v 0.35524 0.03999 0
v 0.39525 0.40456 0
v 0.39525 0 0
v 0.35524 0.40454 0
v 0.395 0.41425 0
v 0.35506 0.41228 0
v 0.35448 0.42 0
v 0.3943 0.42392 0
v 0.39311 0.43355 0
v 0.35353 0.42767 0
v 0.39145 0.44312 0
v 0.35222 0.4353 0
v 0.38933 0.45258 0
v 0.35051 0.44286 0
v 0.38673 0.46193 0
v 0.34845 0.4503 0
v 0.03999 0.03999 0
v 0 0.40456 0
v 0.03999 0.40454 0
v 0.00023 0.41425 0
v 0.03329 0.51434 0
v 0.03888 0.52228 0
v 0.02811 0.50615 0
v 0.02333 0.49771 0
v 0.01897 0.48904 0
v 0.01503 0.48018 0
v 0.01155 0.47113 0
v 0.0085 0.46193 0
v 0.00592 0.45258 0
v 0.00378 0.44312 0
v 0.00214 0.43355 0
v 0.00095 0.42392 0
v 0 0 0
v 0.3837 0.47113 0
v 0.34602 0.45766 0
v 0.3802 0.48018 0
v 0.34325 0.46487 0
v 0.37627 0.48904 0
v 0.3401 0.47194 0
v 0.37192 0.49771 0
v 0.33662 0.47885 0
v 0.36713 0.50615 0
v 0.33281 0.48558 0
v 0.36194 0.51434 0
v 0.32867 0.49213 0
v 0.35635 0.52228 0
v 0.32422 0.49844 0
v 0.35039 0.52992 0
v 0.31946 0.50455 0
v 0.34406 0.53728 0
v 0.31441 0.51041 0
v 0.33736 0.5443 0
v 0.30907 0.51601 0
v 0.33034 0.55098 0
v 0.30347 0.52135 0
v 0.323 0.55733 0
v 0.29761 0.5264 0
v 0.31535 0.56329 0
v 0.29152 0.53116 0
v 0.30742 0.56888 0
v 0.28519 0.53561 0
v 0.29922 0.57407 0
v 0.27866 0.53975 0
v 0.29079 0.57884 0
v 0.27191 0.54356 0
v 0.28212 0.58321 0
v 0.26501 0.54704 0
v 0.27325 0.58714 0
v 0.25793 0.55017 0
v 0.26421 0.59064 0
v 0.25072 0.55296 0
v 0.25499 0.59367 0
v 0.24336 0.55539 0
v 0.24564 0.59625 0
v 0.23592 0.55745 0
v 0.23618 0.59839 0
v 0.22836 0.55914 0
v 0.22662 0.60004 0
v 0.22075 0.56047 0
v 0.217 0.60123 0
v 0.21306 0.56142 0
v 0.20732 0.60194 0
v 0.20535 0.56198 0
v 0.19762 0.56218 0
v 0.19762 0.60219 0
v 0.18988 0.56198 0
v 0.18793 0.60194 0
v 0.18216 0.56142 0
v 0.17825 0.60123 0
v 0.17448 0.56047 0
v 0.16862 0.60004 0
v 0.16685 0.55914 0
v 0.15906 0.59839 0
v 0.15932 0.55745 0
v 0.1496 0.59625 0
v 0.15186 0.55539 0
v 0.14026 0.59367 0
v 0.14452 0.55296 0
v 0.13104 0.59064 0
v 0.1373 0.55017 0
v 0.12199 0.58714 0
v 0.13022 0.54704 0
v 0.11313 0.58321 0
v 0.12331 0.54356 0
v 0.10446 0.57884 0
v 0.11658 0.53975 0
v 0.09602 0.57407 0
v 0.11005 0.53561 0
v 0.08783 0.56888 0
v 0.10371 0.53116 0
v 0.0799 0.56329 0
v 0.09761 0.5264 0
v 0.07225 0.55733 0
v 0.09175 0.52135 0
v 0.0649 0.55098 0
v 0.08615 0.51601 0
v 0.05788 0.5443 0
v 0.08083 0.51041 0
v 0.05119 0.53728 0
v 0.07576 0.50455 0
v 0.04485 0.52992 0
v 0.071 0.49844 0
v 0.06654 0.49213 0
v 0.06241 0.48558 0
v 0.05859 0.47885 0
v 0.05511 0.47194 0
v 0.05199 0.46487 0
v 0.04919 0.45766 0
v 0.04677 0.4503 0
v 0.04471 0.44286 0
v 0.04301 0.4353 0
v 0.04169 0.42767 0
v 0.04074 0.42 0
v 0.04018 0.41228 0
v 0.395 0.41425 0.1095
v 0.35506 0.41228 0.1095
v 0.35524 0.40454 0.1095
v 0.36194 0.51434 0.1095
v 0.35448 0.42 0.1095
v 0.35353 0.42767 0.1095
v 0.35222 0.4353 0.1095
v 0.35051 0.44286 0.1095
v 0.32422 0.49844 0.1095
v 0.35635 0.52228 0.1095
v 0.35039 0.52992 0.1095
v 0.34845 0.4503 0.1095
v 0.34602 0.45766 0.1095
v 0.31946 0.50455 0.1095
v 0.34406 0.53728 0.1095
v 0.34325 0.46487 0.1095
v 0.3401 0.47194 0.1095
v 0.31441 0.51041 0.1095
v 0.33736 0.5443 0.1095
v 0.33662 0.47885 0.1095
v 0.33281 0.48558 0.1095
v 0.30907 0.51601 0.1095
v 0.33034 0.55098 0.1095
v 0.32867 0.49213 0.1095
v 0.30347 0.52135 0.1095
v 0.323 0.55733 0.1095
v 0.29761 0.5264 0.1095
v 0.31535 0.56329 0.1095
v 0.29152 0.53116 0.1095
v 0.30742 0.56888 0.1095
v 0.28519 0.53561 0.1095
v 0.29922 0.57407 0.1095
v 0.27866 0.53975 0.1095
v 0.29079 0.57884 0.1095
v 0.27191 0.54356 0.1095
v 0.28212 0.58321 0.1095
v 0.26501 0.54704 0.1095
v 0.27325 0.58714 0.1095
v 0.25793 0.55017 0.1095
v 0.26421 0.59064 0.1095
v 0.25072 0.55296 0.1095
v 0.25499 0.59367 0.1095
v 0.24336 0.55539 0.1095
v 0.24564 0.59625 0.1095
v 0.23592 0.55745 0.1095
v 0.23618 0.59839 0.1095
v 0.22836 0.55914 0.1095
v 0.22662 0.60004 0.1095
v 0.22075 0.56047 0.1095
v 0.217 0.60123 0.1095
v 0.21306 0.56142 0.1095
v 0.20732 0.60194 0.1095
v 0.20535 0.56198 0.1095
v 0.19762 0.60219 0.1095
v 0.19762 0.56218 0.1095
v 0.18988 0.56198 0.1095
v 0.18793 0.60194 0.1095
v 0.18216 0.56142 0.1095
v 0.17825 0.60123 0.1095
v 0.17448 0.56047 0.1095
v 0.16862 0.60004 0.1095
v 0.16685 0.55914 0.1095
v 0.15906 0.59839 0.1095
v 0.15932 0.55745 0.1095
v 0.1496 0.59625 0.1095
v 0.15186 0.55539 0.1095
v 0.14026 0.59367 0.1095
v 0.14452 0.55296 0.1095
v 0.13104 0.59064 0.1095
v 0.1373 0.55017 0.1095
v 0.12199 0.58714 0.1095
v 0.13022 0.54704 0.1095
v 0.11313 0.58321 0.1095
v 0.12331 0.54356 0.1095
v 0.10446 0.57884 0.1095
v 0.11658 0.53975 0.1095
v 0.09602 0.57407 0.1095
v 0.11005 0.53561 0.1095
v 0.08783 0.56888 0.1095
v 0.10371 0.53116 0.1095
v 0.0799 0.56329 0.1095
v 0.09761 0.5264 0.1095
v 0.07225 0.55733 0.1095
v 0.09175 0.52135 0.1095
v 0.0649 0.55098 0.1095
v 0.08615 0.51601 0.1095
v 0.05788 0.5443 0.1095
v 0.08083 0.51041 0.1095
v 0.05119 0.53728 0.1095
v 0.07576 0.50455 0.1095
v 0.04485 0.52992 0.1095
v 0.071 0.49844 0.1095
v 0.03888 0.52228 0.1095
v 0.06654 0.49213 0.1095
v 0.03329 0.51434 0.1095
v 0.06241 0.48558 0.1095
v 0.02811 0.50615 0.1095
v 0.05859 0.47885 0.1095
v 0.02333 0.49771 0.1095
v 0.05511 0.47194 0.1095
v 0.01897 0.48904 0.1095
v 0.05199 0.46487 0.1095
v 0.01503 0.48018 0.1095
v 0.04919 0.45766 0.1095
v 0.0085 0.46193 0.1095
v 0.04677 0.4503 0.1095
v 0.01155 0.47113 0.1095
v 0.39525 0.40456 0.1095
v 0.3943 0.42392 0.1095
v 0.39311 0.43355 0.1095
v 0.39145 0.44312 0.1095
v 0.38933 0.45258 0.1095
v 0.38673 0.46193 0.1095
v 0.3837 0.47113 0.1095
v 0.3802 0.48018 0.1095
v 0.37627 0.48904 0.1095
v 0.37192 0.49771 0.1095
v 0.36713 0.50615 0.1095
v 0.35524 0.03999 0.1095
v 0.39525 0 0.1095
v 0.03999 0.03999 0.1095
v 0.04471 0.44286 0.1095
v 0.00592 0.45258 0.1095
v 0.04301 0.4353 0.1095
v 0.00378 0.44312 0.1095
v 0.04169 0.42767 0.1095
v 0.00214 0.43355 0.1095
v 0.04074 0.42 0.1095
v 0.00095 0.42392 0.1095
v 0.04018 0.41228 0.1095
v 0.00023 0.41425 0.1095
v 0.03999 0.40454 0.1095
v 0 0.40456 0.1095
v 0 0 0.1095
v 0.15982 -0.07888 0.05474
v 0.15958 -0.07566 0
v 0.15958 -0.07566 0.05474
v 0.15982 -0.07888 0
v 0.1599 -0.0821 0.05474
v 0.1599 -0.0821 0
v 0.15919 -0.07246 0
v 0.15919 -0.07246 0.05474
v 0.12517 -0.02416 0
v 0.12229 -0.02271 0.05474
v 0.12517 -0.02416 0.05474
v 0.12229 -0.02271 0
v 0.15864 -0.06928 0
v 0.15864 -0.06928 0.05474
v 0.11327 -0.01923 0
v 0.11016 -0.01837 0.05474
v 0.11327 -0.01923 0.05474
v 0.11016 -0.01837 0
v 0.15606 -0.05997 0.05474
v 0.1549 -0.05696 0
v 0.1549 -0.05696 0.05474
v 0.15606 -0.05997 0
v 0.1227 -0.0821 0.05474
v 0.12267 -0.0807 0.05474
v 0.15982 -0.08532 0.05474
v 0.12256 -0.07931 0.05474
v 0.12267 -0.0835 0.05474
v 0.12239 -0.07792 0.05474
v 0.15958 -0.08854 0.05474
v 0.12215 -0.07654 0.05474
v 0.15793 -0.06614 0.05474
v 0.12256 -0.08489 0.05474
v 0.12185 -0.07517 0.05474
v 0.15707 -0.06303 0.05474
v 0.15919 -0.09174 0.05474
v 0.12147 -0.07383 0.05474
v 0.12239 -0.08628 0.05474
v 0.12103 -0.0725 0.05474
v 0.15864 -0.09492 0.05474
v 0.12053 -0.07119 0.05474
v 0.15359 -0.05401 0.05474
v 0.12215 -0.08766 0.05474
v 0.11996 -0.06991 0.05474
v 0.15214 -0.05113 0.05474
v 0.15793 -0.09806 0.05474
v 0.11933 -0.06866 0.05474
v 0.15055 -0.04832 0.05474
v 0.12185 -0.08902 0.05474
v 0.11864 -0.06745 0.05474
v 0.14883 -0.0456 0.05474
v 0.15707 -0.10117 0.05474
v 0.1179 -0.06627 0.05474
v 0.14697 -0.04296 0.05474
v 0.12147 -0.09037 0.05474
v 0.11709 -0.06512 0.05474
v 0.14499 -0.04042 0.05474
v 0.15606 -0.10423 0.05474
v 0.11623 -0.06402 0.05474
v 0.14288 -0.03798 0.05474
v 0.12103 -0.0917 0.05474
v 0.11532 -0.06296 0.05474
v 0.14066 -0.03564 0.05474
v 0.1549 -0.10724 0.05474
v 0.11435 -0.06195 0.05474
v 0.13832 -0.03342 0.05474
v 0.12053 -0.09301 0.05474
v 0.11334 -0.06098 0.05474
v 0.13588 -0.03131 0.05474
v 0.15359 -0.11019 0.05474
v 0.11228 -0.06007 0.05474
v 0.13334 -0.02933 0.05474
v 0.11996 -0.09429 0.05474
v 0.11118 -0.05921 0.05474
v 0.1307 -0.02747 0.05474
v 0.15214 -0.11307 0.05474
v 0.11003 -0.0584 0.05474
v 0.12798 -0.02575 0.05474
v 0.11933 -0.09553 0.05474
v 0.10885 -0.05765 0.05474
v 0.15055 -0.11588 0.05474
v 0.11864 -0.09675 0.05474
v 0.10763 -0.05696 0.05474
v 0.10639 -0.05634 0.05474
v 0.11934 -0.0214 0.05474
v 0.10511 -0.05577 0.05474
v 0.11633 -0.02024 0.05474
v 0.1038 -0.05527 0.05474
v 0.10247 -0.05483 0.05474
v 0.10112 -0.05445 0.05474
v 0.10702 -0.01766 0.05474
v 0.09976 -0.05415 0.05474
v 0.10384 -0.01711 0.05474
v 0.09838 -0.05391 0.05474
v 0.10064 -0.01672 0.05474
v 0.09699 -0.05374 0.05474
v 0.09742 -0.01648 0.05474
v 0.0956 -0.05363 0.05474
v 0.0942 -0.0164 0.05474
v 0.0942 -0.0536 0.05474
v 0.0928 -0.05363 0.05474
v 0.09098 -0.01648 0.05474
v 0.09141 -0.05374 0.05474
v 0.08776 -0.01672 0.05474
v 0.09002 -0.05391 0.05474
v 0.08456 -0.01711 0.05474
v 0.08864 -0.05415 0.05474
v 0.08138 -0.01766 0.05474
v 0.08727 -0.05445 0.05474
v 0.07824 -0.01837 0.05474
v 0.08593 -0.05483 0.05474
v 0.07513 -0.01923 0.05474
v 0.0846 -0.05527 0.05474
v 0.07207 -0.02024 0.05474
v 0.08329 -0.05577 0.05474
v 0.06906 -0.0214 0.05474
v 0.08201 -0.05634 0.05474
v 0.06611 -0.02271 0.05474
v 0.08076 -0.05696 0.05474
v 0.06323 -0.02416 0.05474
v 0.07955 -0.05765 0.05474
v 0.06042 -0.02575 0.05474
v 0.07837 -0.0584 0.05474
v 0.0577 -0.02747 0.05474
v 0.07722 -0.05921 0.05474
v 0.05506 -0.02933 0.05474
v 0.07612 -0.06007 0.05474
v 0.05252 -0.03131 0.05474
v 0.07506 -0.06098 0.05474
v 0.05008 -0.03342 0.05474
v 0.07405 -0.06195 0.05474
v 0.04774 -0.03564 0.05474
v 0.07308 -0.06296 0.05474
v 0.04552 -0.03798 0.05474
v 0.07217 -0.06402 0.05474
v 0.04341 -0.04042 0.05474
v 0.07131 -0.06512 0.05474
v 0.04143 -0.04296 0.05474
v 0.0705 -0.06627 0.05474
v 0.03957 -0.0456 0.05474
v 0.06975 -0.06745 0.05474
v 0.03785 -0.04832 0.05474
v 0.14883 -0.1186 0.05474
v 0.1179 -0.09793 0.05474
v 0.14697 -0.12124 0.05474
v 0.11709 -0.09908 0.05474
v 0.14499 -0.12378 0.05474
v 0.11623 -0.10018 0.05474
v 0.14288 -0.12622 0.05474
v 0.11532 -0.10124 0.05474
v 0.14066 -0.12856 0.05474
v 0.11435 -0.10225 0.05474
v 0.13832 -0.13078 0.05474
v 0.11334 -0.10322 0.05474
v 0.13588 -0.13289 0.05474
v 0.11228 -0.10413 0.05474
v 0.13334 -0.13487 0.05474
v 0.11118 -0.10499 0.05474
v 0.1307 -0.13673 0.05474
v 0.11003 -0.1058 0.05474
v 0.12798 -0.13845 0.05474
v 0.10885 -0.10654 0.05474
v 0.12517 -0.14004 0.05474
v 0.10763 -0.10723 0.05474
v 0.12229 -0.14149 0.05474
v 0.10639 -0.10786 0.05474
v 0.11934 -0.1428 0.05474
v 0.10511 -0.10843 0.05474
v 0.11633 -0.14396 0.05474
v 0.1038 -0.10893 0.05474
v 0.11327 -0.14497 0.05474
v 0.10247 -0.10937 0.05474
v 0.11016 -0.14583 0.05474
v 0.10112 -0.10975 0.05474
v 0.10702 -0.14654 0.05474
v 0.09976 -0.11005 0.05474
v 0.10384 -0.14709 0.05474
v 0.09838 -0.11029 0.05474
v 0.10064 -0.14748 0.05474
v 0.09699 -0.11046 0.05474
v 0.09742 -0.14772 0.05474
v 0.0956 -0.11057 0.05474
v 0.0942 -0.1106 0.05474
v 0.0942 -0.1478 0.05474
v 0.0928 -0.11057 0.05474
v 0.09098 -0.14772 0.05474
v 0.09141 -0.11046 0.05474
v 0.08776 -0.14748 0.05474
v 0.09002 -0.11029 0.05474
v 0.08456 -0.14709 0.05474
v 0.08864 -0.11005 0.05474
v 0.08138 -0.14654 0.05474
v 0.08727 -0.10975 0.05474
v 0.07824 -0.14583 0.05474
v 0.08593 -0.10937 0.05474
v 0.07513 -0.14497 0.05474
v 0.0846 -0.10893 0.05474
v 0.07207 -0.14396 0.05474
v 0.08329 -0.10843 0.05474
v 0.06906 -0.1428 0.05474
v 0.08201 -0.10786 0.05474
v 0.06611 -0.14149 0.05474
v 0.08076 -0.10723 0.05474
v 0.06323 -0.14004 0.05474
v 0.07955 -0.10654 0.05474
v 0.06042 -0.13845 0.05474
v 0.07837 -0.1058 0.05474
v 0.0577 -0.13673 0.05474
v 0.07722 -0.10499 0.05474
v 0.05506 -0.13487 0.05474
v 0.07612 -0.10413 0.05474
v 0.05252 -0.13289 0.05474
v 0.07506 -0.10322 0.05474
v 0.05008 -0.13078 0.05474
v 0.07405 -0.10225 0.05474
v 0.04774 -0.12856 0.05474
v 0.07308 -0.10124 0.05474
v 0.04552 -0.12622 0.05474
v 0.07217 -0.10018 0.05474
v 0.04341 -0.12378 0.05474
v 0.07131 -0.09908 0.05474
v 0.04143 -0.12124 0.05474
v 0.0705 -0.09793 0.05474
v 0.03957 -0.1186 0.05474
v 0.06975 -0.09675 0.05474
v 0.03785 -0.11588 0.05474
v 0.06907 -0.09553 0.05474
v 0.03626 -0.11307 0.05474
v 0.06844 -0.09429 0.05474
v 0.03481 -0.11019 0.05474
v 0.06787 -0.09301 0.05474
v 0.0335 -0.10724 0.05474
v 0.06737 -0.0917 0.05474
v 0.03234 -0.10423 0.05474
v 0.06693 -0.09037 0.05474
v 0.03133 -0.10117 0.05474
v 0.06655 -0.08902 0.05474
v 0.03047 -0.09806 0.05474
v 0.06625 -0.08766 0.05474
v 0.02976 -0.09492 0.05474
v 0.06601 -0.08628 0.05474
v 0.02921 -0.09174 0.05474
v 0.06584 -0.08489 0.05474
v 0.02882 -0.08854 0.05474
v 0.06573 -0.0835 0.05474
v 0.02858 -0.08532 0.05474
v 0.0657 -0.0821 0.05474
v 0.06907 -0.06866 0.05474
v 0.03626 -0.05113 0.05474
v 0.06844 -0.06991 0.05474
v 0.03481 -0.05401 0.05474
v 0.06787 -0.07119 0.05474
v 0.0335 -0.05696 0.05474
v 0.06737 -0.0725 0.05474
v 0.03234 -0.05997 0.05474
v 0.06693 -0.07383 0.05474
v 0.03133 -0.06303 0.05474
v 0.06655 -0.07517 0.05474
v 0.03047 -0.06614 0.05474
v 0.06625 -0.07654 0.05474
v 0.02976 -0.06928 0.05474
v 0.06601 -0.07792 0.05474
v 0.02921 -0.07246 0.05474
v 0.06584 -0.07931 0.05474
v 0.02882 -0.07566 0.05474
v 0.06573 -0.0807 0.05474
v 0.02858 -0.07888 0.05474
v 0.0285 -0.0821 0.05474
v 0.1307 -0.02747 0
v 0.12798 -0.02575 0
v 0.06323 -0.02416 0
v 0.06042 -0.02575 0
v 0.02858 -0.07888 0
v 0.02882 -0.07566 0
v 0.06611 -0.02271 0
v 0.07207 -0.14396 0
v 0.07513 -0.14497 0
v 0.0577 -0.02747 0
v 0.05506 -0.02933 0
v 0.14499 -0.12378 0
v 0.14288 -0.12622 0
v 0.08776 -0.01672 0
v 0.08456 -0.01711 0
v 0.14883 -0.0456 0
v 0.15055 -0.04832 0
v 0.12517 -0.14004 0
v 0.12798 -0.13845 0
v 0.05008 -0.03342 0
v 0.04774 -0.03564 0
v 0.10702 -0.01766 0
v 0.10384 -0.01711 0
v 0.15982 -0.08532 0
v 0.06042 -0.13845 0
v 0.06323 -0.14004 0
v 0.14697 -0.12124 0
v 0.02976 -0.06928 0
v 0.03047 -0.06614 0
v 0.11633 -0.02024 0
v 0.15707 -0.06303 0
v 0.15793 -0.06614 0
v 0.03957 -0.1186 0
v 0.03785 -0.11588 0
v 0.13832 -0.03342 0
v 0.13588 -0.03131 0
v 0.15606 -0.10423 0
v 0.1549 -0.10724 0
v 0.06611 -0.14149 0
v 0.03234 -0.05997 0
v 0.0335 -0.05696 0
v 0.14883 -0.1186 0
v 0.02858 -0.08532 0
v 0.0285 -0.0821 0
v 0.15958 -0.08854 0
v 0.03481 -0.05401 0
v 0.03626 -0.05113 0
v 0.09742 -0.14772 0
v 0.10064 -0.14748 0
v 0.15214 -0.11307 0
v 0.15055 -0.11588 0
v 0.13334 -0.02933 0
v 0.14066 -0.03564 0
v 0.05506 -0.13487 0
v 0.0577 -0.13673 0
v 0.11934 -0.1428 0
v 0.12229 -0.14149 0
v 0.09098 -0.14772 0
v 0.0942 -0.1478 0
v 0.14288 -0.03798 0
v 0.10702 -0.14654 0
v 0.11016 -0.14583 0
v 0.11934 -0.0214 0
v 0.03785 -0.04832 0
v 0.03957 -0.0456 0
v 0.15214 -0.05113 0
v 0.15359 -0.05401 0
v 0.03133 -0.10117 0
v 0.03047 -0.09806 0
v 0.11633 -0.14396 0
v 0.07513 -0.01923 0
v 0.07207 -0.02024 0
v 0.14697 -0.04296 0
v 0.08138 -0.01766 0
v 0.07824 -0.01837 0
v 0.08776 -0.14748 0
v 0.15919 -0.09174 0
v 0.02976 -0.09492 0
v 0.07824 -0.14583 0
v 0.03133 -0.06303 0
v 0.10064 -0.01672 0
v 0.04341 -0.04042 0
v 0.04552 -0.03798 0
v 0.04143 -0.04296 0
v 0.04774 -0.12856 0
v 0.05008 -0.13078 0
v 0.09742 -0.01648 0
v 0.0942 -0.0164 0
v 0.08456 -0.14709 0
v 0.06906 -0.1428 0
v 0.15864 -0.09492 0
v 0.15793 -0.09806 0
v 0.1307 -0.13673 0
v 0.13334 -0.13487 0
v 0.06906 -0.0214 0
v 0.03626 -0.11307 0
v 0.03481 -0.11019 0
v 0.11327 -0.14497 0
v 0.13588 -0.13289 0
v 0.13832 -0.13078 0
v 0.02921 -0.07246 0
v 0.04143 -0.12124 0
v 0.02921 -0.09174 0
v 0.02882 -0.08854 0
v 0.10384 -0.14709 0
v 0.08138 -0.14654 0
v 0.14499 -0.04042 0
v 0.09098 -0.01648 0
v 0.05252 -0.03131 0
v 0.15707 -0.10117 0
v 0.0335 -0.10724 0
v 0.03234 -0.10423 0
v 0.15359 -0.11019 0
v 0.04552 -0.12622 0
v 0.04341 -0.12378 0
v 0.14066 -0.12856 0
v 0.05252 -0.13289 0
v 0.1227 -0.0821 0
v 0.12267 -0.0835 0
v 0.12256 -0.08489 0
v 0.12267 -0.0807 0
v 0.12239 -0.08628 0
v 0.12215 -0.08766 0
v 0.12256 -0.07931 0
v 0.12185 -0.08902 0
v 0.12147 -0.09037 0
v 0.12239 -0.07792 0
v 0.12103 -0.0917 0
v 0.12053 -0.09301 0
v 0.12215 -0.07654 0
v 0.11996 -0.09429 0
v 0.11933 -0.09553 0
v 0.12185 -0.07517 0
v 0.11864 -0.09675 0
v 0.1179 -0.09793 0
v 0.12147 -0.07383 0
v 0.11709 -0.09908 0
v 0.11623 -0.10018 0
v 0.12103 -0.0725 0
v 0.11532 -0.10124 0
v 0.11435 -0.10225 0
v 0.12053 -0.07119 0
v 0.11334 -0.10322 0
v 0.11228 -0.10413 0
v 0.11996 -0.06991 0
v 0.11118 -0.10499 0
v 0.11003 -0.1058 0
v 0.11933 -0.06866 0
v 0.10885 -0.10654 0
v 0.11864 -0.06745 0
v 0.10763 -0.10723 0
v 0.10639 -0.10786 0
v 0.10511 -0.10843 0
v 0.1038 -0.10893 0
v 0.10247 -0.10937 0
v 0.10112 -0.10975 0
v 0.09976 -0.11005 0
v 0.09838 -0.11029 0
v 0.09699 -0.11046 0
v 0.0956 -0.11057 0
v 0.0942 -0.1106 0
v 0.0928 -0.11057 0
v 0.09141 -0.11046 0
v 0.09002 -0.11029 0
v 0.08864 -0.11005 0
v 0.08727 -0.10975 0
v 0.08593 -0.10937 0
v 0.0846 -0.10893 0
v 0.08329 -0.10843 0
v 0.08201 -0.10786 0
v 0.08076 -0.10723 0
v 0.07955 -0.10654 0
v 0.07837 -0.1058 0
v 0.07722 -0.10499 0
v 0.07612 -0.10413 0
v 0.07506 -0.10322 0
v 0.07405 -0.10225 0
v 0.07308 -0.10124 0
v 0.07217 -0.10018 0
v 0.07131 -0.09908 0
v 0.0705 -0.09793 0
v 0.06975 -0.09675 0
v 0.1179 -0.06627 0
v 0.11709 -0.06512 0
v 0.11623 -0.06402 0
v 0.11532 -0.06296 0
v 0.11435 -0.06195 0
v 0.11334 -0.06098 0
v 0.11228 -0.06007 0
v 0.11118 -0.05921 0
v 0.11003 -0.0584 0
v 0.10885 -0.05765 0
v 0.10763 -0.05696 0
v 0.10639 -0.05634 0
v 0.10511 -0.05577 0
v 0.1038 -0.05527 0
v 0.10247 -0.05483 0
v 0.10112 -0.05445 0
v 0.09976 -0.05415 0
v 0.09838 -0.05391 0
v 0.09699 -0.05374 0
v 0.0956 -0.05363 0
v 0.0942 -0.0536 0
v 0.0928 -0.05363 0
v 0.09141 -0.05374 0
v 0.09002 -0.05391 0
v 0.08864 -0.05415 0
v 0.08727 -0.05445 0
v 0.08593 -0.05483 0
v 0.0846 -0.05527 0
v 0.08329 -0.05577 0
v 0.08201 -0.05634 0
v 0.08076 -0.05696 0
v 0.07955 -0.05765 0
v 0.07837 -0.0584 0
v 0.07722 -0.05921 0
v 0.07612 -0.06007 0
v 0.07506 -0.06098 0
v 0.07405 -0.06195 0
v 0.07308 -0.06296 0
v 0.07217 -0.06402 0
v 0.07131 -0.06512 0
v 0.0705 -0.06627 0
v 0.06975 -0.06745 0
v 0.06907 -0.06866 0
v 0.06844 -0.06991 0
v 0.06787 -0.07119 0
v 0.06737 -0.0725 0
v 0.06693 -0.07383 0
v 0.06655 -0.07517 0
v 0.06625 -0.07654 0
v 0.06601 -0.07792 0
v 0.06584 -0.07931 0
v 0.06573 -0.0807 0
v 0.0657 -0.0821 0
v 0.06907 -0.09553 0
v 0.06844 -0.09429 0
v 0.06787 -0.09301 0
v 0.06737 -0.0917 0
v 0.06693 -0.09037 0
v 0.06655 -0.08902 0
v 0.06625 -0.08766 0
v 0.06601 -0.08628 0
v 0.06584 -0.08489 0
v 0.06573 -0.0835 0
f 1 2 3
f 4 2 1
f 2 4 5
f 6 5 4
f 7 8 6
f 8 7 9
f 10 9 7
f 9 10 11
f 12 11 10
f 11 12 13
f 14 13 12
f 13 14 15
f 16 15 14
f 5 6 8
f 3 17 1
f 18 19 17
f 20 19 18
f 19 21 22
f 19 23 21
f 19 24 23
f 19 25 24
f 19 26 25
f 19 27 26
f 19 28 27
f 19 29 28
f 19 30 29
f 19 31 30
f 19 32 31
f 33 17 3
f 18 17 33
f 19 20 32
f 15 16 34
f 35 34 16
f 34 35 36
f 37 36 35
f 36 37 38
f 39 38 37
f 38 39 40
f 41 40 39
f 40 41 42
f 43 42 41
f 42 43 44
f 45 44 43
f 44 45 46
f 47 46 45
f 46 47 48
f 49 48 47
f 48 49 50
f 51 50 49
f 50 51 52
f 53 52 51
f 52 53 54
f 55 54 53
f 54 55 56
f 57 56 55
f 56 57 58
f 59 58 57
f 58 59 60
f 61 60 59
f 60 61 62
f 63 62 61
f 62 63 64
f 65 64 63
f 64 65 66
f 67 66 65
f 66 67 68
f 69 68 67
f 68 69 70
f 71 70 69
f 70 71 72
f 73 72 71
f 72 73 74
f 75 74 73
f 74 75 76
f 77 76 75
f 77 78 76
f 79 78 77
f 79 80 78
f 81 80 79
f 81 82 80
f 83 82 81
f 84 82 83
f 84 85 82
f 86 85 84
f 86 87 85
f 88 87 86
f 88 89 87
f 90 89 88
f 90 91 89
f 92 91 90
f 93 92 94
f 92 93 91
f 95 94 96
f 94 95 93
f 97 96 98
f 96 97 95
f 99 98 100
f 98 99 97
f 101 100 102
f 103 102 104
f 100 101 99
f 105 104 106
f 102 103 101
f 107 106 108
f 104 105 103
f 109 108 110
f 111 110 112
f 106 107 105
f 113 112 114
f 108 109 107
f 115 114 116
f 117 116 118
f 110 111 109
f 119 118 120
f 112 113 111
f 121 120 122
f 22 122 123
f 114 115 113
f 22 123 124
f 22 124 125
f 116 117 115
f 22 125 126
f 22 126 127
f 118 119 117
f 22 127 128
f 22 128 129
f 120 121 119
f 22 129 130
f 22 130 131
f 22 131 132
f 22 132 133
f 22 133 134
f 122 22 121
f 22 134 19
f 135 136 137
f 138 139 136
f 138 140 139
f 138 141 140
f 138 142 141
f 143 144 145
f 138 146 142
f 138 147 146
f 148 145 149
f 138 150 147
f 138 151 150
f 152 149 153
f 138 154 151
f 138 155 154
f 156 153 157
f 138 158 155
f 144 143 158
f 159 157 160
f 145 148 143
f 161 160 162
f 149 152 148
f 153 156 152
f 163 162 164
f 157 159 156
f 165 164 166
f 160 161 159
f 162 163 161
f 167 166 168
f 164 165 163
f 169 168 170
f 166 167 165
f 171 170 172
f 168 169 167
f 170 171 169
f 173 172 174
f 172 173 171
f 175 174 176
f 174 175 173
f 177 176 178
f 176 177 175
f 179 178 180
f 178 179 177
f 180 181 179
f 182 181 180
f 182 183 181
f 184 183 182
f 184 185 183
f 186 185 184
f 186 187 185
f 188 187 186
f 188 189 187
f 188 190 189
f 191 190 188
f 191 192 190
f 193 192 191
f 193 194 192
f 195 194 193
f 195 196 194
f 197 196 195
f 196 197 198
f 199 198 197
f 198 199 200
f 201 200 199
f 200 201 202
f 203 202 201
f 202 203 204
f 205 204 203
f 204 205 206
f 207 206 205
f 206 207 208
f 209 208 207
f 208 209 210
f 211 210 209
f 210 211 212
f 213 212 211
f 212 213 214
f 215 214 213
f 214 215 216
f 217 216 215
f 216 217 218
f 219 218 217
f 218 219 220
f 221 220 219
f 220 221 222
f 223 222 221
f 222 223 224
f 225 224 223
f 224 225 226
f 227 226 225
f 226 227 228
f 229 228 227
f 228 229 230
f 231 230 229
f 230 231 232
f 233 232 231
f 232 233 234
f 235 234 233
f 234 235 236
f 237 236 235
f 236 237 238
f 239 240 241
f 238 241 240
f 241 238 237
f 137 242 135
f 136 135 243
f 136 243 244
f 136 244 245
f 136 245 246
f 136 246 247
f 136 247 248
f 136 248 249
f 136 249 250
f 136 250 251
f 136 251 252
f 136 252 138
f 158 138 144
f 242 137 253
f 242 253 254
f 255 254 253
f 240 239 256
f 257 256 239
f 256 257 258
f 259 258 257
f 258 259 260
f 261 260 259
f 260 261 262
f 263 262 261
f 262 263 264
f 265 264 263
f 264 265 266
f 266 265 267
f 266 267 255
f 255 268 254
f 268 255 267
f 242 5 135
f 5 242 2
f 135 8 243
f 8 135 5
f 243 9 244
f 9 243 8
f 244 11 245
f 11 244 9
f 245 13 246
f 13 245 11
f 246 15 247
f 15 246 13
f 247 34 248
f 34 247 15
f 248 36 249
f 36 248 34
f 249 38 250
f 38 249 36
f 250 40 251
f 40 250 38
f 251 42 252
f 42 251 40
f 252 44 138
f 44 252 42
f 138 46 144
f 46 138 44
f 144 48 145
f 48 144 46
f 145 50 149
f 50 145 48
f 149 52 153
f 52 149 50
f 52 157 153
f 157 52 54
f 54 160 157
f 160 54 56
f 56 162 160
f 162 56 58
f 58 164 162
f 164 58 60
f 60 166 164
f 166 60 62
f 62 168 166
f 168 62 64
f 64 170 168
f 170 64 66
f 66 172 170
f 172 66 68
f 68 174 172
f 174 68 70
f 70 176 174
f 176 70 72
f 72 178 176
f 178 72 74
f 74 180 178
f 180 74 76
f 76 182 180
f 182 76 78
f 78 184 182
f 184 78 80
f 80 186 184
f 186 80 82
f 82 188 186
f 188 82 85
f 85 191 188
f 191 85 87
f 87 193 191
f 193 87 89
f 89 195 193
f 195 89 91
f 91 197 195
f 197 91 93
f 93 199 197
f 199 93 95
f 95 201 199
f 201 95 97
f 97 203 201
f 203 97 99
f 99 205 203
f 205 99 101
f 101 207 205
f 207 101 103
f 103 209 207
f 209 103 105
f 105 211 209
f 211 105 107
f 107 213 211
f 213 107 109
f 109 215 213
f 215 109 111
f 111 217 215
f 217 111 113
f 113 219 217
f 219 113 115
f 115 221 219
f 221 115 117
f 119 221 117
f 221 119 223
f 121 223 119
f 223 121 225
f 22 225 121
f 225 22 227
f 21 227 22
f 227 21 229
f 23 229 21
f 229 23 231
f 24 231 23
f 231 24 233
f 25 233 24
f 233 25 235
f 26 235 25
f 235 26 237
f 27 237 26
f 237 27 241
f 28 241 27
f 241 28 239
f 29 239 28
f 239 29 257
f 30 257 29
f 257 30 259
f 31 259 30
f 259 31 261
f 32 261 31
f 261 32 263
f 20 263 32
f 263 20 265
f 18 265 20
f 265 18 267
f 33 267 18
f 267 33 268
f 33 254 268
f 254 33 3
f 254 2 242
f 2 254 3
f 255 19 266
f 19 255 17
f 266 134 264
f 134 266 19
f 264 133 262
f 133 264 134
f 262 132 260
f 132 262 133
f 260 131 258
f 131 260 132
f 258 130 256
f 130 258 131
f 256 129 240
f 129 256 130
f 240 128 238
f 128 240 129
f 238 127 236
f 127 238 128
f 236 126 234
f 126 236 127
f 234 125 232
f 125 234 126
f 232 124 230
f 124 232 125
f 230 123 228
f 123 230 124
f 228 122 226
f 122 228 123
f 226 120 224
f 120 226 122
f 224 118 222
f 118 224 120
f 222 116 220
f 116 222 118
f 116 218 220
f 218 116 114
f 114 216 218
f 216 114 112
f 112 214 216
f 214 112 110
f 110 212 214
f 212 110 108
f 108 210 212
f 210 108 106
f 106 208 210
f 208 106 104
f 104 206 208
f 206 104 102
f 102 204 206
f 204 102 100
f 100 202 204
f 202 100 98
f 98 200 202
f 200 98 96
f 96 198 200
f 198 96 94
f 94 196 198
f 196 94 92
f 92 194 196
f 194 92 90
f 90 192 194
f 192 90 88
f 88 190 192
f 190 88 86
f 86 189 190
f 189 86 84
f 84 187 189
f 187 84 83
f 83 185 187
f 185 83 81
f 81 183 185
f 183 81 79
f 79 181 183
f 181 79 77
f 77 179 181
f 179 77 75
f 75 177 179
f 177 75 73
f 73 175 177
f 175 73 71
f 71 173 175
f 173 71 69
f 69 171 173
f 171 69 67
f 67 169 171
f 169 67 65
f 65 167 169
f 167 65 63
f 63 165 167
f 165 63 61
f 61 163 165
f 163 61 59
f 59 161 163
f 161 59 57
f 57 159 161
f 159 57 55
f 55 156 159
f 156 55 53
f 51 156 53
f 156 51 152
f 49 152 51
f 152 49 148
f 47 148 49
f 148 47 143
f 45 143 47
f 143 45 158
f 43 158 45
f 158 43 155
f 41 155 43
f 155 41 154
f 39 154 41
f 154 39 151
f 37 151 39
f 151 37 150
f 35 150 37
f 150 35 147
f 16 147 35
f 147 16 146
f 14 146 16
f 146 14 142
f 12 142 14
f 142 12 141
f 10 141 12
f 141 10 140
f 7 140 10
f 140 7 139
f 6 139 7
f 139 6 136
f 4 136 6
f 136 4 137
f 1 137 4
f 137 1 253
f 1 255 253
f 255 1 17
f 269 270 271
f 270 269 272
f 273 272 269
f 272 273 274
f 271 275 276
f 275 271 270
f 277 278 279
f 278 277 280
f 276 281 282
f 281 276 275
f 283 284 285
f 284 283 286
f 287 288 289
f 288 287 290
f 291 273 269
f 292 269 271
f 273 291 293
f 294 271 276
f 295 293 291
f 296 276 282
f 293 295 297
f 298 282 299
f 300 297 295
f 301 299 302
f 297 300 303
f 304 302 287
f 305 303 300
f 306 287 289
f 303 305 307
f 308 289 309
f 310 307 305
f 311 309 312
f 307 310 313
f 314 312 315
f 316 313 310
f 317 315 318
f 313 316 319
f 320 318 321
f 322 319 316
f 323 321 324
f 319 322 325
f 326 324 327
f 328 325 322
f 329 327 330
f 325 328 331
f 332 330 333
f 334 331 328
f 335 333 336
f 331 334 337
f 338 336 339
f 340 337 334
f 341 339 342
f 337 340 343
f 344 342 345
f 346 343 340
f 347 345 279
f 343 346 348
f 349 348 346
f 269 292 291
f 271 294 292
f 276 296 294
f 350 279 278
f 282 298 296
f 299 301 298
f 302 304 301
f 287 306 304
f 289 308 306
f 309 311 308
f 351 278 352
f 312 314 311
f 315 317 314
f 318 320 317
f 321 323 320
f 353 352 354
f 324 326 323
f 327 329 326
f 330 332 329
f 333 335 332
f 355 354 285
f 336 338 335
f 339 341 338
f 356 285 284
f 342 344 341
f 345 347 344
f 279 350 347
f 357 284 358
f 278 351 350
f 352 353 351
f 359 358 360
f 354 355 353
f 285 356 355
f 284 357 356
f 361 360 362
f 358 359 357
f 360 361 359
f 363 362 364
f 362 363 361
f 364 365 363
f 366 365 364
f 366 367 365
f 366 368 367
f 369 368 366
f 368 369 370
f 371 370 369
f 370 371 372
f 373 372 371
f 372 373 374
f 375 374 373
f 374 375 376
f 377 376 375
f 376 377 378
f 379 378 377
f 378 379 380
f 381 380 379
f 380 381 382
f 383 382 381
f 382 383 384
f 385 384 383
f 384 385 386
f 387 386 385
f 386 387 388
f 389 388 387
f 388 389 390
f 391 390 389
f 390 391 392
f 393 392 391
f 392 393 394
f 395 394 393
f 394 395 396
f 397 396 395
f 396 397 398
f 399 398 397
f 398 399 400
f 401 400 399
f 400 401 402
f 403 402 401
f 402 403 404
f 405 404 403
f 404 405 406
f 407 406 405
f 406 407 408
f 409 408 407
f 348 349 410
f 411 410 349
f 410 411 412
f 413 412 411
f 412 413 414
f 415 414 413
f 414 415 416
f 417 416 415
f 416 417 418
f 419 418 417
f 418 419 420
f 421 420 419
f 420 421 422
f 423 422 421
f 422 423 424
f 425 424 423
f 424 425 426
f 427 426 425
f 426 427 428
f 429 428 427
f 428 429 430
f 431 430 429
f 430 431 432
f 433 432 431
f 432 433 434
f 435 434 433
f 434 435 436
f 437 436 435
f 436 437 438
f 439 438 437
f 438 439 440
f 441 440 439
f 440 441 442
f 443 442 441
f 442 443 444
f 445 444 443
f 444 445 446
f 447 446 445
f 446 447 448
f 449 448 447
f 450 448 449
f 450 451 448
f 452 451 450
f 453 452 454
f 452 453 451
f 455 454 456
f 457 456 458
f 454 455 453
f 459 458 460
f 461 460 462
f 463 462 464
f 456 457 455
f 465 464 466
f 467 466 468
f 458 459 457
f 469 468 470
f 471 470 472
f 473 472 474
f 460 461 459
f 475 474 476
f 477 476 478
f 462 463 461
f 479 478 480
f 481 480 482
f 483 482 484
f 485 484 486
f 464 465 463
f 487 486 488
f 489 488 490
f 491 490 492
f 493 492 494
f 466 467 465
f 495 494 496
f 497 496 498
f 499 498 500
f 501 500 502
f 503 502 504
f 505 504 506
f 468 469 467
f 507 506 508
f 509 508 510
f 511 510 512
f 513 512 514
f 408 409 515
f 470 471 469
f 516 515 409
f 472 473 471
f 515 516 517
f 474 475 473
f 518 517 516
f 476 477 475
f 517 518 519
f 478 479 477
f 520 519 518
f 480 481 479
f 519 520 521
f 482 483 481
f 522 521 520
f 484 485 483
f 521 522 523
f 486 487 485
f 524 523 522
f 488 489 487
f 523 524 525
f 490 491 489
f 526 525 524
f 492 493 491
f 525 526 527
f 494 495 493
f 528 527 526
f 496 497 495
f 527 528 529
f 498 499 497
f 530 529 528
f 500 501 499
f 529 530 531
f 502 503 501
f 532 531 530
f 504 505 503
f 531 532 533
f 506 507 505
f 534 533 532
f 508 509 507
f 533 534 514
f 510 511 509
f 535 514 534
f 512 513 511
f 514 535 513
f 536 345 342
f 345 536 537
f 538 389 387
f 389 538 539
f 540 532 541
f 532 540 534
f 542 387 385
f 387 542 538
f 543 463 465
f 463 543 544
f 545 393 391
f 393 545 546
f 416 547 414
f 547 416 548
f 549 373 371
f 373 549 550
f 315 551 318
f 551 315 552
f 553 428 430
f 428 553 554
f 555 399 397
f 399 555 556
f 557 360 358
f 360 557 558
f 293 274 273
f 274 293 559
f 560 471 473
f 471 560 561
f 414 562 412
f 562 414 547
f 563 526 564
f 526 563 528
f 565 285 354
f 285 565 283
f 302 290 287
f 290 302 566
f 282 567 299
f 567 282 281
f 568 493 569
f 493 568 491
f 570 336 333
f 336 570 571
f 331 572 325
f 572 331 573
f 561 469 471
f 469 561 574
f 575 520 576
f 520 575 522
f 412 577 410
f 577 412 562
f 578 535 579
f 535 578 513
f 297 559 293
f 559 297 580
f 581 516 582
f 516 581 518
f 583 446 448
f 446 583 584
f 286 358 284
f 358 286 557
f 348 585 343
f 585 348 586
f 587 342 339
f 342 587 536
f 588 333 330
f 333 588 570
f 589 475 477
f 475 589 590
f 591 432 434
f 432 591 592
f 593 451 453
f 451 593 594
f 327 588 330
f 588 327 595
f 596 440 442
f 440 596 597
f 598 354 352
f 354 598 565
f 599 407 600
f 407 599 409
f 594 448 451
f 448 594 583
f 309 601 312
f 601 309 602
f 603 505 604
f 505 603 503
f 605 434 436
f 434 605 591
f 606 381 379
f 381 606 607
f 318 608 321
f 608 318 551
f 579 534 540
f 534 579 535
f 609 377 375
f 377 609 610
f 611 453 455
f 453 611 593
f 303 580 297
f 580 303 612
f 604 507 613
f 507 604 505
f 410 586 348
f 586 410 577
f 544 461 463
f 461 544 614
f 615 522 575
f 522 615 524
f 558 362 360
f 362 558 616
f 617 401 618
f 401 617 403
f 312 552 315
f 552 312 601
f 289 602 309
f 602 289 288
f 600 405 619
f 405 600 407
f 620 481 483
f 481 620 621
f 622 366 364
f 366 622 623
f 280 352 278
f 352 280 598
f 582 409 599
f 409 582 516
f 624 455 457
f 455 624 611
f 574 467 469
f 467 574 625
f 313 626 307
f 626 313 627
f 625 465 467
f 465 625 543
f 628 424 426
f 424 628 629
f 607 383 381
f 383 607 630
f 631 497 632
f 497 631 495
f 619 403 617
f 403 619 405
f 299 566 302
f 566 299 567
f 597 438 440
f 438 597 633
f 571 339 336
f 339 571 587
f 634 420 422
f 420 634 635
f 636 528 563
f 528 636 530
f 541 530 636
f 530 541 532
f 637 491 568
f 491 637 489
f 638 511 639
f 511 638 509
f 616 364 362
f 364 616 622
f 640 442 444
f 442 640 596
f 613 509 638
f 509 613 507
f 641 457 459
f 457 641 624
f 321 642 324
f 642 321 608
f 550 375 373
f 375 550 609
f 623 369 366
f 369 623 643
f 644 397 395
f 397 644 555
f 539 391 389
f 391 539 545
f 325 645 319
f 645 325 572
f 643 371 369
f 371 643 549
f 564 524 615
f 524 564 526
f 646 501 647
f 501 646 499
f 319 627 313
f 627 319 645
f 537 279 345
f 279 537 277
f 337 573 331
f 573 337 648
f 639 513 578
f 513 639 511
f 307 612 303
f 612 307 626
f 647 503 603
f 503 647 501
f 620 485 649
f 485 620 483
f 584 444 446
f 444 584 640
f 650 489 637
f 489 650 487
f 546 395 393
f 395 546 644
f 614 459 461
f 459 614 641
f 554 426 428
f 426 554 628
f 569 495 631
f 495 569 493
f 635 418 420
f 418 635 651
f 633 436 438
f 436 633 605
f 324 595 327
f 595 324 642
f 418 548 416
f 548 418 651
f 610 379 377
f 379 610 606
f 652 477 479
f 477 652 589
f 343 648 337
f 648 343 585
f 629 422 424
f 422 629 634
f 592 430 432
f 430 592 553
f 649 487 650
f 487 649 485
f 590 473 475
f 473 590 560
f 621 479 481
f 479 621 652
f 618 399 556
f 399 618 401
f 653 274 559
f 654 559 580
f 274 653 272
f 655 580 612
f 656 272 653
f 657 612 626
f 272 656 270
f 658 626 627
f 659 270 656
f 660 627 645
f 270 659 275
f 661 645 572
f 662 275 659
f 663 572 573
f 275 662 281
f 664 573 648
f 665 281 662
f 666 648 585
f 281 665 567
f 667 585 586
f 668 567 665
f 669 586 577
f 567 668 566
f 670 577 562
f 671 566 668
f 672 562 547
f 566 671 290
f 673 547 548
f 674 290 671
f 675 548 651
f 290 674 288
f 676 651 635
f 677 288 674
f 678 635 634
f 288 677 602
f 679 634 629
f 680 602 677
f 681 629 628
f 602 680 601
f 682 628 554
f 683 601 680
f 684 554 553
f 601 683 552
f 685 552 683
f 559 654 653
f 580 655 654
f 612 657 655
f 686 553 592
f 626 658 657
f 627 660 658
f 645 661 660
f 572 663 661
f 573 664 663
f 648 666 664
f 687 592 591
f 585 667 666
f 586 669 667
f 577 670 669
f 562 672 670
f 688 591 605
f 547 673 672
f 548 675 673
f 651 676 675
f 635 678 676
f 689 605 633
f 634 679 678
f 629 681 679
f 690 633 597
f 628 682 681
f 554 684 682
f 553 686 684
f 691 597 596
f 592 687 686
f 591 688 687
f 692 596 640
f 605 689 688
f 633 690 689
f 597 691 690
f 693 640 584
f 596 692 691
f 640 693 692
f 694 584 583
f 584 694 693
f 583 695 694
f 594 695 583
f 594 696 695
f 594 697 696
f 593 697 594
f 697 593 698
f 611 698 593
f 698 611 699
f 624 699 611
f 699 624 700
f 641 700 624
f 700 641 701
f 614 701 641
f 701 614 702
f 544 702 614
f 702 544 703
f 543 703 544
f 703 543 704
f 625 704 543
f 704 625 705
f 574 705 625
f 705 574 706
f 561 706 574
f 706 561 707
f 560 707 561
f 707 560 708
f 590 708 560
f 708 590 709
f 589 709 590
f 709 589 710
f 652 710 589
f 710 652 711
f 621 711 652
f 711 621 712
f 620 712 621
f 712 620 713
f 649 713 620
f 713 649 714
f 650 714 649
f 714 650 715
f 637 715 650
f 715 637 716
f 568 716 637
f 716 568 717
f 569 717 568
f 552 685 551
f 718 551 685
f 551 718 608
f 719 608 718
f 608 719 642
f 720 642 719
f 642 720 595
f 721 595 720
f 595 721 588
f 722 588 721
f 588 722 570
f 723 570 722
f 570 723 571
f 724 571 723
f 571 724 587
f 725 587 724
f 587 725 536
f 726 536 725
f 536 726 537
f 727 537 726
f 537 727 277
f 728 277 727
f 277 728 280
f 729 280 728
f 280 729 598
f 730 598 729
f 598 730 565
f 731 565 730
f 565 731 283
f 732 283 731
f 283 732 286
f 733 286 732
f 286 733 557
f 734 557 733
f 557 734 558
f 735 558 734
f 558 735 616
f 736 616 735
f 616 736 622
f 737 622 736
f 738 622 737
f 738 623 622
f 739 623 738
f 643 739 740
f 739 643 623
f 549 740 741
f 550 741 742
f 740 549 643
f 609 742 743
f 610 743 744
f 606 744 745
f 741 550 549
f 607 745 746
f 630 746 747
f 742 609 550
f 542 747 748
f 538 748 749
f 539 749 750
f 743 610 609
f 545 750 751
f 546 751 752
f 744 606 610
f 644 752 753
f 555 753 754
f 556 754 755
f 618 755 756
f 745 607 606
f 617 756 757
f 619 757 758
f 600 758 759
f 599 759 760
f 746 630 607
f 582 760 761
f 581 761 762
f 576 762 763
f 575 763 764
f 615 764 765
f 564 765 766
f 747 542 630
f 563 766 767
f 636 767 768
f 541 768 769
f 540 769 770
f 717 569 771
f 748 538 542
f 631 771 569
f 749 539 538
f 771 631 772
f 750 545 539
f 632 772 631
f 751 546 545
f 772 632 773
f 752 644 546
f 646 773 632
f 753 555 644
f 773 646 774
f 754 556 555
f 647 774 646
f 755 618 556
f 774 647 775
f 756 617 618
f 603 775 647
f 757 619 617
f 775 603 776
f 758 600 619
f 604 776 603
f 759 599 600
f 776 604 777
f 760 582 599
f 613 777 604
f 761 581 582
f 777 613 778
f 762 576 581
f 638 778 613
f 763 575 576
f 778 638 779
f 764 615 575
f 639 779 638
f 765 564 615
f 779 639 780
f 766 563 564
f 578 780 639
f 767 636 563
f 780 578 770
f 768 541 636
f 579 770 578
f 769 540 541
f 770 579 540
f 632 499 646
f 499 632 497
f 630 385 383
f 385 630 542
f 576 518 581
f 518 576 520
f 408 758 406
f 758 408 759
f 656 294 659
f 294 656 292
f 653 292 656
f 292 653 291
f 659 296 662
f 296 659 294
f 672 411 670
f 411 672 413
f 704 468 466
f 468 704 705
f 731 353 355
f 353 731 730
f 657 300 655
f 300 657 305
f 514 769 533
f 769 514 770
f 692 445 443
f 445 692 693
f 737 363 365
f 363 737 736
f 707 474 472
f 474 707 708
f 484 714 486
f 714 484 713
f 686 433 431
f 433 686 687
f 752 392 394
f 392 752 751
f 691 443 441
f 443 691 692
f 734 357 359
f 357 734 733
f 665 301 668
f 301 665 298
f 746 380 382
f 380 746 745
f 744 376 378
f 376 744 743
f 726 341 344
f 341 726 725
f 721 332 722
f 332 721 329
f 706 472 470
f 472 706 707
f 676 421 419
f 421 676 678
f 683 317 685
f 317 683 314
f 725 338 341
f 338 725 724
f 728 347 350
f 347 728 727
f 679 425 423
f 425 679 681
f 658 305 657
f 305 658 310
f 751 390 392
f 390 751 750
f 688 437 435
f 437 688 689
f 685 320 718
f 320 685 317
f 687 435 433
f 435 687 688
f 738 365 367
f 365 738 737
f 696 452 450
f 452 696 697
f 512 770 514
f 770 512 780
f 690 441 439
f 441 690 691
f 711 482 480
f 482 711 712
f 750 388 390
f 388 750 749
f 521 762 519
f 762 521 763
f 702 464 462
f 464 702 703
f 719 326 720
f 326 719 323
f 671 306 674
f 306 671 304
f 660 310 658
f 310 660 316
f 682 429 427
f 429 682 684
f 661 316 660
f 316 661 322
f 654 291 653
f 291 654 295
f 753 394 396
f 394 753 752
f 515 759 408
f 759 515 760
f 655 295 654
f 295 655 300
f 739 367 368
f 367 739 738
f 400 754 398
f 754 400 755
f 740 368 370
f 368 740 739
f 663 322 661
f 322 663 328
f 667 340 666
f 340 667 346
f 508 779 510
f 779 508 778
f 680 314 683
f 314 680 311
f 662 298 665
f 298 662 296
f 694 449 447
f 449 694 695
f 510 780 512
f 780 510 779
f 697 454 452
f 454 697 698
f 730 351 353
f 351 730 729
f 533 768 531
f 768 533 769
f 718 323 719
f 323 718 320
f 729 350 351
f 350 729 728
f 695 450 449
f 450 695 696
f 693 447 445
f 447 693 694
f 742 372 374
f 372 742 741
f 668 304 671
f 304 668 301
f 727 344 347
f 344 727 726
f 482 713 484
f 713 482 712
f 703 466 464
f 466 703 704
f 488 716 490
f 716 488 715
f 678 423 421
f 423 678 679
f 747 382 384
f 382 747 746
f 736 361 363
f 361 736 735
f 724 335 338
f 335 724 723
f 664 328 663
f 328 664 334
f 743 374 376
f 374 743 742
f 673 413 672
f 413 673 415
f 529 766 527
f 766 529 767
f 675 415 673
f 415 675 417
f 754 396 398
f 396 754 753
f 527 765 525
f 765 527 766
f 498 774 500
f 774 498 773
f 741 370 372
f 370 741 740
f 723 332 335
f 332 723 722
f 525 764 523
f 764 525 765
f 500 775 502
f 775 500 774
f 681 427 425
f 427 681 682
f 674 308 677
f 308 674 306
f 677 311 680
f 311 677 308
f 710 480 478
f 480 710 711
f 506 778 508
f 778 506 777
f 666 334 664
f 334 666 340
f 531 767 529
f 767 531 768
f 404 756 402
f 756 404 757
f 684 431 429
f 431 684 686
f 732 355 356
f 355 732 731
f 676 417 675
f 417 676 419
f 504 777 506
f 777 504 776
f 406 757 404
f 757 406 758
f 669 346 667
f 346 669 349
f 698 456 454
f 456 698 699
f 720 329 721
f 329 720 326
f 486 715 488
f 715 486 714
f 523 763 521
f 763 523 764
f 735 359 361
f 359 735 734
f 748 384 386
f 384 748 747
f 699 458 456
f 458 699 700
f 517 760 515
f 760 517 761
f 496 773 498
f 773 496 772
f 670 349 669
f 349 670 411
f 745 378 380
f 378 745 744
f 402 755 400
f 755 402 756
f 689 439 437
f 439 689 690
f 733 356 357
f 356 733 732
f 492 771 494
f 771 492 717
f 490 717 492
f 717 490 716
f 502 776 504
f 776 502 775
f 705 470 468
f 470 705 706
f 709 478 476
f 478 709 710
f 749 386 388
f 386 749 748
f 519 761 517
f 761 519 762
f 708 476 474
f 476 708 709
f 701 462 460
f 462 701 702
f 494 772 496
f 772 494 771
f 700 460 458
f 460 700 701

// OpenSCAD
// =========================================================
// Parametric D-Shaped Frame with Shallow Protrusion & Cut
// =========================================================

$fn = 128;

// Base & Frame Parameters
base_length      = 0.395255;
base_width       = 0.60219;
base_height      = 0.109489;
extrusion_depth  = 0.1095;
frame_wall_thick = 0.04;

// Protrusion Parameters
protr_axis_x     = 0.0942;
protr_axis_y     = -0.0821;
protr_radius     = 0.0657;
protr_height     = 0.054745;

// Cut Parameters
cut_radius       = 0.0285;
cut_height       = 0.056;

// =========================================================
// Profile Definitions
// =========================================================

// Outer D-shape (flat rear, curved front)
module profile_outer() {
    arc_r = base_length / 2;
    straight_h = base_width - arc_r;
    union() {
        square([base_length, straight_h]);
        translate([base_length/2, straight_h]) circle(r=arc_r);
    }
}

// Inner D-shape (uniform inward offset)
module profile_inner() {
    arc_r = base_length / 2 - frame_wall_thick;
    straight_h = base_width - base_length/2 - frame_wall_thick;
    translate([frame_wall_thick, frame_wall_thick]) {
        union() {
            square([base_length - 2*frame_wall_thick, straight_h]);
            translate([(base_length - 2*frame_wall_thick)/2, straight_h]) circle(r=arc_r);
        }
    }
}

// =========================================================
// Main Assembly
// =========================================================

difference() {
    union() {
        // Full-depth D-shaped frame
        linear_extrude(height=extrusion_depth) {
            difference() {
                profile_outer();
                profile_inner();
            }
        }

        // Shallow round protrusion attached outside front-left
        translate([protr_axis_x, protr_axis_y, 0]) {
            cylinder(r=protr_radius, h=protr_height);
        }
    }

    // Concentric circular through-cut in the protrusion
    translate([protr_axis_x, protr_axis_y, -0.001]) {
        cylinder(r=cut_radius, h=cut_height);
    }
}
